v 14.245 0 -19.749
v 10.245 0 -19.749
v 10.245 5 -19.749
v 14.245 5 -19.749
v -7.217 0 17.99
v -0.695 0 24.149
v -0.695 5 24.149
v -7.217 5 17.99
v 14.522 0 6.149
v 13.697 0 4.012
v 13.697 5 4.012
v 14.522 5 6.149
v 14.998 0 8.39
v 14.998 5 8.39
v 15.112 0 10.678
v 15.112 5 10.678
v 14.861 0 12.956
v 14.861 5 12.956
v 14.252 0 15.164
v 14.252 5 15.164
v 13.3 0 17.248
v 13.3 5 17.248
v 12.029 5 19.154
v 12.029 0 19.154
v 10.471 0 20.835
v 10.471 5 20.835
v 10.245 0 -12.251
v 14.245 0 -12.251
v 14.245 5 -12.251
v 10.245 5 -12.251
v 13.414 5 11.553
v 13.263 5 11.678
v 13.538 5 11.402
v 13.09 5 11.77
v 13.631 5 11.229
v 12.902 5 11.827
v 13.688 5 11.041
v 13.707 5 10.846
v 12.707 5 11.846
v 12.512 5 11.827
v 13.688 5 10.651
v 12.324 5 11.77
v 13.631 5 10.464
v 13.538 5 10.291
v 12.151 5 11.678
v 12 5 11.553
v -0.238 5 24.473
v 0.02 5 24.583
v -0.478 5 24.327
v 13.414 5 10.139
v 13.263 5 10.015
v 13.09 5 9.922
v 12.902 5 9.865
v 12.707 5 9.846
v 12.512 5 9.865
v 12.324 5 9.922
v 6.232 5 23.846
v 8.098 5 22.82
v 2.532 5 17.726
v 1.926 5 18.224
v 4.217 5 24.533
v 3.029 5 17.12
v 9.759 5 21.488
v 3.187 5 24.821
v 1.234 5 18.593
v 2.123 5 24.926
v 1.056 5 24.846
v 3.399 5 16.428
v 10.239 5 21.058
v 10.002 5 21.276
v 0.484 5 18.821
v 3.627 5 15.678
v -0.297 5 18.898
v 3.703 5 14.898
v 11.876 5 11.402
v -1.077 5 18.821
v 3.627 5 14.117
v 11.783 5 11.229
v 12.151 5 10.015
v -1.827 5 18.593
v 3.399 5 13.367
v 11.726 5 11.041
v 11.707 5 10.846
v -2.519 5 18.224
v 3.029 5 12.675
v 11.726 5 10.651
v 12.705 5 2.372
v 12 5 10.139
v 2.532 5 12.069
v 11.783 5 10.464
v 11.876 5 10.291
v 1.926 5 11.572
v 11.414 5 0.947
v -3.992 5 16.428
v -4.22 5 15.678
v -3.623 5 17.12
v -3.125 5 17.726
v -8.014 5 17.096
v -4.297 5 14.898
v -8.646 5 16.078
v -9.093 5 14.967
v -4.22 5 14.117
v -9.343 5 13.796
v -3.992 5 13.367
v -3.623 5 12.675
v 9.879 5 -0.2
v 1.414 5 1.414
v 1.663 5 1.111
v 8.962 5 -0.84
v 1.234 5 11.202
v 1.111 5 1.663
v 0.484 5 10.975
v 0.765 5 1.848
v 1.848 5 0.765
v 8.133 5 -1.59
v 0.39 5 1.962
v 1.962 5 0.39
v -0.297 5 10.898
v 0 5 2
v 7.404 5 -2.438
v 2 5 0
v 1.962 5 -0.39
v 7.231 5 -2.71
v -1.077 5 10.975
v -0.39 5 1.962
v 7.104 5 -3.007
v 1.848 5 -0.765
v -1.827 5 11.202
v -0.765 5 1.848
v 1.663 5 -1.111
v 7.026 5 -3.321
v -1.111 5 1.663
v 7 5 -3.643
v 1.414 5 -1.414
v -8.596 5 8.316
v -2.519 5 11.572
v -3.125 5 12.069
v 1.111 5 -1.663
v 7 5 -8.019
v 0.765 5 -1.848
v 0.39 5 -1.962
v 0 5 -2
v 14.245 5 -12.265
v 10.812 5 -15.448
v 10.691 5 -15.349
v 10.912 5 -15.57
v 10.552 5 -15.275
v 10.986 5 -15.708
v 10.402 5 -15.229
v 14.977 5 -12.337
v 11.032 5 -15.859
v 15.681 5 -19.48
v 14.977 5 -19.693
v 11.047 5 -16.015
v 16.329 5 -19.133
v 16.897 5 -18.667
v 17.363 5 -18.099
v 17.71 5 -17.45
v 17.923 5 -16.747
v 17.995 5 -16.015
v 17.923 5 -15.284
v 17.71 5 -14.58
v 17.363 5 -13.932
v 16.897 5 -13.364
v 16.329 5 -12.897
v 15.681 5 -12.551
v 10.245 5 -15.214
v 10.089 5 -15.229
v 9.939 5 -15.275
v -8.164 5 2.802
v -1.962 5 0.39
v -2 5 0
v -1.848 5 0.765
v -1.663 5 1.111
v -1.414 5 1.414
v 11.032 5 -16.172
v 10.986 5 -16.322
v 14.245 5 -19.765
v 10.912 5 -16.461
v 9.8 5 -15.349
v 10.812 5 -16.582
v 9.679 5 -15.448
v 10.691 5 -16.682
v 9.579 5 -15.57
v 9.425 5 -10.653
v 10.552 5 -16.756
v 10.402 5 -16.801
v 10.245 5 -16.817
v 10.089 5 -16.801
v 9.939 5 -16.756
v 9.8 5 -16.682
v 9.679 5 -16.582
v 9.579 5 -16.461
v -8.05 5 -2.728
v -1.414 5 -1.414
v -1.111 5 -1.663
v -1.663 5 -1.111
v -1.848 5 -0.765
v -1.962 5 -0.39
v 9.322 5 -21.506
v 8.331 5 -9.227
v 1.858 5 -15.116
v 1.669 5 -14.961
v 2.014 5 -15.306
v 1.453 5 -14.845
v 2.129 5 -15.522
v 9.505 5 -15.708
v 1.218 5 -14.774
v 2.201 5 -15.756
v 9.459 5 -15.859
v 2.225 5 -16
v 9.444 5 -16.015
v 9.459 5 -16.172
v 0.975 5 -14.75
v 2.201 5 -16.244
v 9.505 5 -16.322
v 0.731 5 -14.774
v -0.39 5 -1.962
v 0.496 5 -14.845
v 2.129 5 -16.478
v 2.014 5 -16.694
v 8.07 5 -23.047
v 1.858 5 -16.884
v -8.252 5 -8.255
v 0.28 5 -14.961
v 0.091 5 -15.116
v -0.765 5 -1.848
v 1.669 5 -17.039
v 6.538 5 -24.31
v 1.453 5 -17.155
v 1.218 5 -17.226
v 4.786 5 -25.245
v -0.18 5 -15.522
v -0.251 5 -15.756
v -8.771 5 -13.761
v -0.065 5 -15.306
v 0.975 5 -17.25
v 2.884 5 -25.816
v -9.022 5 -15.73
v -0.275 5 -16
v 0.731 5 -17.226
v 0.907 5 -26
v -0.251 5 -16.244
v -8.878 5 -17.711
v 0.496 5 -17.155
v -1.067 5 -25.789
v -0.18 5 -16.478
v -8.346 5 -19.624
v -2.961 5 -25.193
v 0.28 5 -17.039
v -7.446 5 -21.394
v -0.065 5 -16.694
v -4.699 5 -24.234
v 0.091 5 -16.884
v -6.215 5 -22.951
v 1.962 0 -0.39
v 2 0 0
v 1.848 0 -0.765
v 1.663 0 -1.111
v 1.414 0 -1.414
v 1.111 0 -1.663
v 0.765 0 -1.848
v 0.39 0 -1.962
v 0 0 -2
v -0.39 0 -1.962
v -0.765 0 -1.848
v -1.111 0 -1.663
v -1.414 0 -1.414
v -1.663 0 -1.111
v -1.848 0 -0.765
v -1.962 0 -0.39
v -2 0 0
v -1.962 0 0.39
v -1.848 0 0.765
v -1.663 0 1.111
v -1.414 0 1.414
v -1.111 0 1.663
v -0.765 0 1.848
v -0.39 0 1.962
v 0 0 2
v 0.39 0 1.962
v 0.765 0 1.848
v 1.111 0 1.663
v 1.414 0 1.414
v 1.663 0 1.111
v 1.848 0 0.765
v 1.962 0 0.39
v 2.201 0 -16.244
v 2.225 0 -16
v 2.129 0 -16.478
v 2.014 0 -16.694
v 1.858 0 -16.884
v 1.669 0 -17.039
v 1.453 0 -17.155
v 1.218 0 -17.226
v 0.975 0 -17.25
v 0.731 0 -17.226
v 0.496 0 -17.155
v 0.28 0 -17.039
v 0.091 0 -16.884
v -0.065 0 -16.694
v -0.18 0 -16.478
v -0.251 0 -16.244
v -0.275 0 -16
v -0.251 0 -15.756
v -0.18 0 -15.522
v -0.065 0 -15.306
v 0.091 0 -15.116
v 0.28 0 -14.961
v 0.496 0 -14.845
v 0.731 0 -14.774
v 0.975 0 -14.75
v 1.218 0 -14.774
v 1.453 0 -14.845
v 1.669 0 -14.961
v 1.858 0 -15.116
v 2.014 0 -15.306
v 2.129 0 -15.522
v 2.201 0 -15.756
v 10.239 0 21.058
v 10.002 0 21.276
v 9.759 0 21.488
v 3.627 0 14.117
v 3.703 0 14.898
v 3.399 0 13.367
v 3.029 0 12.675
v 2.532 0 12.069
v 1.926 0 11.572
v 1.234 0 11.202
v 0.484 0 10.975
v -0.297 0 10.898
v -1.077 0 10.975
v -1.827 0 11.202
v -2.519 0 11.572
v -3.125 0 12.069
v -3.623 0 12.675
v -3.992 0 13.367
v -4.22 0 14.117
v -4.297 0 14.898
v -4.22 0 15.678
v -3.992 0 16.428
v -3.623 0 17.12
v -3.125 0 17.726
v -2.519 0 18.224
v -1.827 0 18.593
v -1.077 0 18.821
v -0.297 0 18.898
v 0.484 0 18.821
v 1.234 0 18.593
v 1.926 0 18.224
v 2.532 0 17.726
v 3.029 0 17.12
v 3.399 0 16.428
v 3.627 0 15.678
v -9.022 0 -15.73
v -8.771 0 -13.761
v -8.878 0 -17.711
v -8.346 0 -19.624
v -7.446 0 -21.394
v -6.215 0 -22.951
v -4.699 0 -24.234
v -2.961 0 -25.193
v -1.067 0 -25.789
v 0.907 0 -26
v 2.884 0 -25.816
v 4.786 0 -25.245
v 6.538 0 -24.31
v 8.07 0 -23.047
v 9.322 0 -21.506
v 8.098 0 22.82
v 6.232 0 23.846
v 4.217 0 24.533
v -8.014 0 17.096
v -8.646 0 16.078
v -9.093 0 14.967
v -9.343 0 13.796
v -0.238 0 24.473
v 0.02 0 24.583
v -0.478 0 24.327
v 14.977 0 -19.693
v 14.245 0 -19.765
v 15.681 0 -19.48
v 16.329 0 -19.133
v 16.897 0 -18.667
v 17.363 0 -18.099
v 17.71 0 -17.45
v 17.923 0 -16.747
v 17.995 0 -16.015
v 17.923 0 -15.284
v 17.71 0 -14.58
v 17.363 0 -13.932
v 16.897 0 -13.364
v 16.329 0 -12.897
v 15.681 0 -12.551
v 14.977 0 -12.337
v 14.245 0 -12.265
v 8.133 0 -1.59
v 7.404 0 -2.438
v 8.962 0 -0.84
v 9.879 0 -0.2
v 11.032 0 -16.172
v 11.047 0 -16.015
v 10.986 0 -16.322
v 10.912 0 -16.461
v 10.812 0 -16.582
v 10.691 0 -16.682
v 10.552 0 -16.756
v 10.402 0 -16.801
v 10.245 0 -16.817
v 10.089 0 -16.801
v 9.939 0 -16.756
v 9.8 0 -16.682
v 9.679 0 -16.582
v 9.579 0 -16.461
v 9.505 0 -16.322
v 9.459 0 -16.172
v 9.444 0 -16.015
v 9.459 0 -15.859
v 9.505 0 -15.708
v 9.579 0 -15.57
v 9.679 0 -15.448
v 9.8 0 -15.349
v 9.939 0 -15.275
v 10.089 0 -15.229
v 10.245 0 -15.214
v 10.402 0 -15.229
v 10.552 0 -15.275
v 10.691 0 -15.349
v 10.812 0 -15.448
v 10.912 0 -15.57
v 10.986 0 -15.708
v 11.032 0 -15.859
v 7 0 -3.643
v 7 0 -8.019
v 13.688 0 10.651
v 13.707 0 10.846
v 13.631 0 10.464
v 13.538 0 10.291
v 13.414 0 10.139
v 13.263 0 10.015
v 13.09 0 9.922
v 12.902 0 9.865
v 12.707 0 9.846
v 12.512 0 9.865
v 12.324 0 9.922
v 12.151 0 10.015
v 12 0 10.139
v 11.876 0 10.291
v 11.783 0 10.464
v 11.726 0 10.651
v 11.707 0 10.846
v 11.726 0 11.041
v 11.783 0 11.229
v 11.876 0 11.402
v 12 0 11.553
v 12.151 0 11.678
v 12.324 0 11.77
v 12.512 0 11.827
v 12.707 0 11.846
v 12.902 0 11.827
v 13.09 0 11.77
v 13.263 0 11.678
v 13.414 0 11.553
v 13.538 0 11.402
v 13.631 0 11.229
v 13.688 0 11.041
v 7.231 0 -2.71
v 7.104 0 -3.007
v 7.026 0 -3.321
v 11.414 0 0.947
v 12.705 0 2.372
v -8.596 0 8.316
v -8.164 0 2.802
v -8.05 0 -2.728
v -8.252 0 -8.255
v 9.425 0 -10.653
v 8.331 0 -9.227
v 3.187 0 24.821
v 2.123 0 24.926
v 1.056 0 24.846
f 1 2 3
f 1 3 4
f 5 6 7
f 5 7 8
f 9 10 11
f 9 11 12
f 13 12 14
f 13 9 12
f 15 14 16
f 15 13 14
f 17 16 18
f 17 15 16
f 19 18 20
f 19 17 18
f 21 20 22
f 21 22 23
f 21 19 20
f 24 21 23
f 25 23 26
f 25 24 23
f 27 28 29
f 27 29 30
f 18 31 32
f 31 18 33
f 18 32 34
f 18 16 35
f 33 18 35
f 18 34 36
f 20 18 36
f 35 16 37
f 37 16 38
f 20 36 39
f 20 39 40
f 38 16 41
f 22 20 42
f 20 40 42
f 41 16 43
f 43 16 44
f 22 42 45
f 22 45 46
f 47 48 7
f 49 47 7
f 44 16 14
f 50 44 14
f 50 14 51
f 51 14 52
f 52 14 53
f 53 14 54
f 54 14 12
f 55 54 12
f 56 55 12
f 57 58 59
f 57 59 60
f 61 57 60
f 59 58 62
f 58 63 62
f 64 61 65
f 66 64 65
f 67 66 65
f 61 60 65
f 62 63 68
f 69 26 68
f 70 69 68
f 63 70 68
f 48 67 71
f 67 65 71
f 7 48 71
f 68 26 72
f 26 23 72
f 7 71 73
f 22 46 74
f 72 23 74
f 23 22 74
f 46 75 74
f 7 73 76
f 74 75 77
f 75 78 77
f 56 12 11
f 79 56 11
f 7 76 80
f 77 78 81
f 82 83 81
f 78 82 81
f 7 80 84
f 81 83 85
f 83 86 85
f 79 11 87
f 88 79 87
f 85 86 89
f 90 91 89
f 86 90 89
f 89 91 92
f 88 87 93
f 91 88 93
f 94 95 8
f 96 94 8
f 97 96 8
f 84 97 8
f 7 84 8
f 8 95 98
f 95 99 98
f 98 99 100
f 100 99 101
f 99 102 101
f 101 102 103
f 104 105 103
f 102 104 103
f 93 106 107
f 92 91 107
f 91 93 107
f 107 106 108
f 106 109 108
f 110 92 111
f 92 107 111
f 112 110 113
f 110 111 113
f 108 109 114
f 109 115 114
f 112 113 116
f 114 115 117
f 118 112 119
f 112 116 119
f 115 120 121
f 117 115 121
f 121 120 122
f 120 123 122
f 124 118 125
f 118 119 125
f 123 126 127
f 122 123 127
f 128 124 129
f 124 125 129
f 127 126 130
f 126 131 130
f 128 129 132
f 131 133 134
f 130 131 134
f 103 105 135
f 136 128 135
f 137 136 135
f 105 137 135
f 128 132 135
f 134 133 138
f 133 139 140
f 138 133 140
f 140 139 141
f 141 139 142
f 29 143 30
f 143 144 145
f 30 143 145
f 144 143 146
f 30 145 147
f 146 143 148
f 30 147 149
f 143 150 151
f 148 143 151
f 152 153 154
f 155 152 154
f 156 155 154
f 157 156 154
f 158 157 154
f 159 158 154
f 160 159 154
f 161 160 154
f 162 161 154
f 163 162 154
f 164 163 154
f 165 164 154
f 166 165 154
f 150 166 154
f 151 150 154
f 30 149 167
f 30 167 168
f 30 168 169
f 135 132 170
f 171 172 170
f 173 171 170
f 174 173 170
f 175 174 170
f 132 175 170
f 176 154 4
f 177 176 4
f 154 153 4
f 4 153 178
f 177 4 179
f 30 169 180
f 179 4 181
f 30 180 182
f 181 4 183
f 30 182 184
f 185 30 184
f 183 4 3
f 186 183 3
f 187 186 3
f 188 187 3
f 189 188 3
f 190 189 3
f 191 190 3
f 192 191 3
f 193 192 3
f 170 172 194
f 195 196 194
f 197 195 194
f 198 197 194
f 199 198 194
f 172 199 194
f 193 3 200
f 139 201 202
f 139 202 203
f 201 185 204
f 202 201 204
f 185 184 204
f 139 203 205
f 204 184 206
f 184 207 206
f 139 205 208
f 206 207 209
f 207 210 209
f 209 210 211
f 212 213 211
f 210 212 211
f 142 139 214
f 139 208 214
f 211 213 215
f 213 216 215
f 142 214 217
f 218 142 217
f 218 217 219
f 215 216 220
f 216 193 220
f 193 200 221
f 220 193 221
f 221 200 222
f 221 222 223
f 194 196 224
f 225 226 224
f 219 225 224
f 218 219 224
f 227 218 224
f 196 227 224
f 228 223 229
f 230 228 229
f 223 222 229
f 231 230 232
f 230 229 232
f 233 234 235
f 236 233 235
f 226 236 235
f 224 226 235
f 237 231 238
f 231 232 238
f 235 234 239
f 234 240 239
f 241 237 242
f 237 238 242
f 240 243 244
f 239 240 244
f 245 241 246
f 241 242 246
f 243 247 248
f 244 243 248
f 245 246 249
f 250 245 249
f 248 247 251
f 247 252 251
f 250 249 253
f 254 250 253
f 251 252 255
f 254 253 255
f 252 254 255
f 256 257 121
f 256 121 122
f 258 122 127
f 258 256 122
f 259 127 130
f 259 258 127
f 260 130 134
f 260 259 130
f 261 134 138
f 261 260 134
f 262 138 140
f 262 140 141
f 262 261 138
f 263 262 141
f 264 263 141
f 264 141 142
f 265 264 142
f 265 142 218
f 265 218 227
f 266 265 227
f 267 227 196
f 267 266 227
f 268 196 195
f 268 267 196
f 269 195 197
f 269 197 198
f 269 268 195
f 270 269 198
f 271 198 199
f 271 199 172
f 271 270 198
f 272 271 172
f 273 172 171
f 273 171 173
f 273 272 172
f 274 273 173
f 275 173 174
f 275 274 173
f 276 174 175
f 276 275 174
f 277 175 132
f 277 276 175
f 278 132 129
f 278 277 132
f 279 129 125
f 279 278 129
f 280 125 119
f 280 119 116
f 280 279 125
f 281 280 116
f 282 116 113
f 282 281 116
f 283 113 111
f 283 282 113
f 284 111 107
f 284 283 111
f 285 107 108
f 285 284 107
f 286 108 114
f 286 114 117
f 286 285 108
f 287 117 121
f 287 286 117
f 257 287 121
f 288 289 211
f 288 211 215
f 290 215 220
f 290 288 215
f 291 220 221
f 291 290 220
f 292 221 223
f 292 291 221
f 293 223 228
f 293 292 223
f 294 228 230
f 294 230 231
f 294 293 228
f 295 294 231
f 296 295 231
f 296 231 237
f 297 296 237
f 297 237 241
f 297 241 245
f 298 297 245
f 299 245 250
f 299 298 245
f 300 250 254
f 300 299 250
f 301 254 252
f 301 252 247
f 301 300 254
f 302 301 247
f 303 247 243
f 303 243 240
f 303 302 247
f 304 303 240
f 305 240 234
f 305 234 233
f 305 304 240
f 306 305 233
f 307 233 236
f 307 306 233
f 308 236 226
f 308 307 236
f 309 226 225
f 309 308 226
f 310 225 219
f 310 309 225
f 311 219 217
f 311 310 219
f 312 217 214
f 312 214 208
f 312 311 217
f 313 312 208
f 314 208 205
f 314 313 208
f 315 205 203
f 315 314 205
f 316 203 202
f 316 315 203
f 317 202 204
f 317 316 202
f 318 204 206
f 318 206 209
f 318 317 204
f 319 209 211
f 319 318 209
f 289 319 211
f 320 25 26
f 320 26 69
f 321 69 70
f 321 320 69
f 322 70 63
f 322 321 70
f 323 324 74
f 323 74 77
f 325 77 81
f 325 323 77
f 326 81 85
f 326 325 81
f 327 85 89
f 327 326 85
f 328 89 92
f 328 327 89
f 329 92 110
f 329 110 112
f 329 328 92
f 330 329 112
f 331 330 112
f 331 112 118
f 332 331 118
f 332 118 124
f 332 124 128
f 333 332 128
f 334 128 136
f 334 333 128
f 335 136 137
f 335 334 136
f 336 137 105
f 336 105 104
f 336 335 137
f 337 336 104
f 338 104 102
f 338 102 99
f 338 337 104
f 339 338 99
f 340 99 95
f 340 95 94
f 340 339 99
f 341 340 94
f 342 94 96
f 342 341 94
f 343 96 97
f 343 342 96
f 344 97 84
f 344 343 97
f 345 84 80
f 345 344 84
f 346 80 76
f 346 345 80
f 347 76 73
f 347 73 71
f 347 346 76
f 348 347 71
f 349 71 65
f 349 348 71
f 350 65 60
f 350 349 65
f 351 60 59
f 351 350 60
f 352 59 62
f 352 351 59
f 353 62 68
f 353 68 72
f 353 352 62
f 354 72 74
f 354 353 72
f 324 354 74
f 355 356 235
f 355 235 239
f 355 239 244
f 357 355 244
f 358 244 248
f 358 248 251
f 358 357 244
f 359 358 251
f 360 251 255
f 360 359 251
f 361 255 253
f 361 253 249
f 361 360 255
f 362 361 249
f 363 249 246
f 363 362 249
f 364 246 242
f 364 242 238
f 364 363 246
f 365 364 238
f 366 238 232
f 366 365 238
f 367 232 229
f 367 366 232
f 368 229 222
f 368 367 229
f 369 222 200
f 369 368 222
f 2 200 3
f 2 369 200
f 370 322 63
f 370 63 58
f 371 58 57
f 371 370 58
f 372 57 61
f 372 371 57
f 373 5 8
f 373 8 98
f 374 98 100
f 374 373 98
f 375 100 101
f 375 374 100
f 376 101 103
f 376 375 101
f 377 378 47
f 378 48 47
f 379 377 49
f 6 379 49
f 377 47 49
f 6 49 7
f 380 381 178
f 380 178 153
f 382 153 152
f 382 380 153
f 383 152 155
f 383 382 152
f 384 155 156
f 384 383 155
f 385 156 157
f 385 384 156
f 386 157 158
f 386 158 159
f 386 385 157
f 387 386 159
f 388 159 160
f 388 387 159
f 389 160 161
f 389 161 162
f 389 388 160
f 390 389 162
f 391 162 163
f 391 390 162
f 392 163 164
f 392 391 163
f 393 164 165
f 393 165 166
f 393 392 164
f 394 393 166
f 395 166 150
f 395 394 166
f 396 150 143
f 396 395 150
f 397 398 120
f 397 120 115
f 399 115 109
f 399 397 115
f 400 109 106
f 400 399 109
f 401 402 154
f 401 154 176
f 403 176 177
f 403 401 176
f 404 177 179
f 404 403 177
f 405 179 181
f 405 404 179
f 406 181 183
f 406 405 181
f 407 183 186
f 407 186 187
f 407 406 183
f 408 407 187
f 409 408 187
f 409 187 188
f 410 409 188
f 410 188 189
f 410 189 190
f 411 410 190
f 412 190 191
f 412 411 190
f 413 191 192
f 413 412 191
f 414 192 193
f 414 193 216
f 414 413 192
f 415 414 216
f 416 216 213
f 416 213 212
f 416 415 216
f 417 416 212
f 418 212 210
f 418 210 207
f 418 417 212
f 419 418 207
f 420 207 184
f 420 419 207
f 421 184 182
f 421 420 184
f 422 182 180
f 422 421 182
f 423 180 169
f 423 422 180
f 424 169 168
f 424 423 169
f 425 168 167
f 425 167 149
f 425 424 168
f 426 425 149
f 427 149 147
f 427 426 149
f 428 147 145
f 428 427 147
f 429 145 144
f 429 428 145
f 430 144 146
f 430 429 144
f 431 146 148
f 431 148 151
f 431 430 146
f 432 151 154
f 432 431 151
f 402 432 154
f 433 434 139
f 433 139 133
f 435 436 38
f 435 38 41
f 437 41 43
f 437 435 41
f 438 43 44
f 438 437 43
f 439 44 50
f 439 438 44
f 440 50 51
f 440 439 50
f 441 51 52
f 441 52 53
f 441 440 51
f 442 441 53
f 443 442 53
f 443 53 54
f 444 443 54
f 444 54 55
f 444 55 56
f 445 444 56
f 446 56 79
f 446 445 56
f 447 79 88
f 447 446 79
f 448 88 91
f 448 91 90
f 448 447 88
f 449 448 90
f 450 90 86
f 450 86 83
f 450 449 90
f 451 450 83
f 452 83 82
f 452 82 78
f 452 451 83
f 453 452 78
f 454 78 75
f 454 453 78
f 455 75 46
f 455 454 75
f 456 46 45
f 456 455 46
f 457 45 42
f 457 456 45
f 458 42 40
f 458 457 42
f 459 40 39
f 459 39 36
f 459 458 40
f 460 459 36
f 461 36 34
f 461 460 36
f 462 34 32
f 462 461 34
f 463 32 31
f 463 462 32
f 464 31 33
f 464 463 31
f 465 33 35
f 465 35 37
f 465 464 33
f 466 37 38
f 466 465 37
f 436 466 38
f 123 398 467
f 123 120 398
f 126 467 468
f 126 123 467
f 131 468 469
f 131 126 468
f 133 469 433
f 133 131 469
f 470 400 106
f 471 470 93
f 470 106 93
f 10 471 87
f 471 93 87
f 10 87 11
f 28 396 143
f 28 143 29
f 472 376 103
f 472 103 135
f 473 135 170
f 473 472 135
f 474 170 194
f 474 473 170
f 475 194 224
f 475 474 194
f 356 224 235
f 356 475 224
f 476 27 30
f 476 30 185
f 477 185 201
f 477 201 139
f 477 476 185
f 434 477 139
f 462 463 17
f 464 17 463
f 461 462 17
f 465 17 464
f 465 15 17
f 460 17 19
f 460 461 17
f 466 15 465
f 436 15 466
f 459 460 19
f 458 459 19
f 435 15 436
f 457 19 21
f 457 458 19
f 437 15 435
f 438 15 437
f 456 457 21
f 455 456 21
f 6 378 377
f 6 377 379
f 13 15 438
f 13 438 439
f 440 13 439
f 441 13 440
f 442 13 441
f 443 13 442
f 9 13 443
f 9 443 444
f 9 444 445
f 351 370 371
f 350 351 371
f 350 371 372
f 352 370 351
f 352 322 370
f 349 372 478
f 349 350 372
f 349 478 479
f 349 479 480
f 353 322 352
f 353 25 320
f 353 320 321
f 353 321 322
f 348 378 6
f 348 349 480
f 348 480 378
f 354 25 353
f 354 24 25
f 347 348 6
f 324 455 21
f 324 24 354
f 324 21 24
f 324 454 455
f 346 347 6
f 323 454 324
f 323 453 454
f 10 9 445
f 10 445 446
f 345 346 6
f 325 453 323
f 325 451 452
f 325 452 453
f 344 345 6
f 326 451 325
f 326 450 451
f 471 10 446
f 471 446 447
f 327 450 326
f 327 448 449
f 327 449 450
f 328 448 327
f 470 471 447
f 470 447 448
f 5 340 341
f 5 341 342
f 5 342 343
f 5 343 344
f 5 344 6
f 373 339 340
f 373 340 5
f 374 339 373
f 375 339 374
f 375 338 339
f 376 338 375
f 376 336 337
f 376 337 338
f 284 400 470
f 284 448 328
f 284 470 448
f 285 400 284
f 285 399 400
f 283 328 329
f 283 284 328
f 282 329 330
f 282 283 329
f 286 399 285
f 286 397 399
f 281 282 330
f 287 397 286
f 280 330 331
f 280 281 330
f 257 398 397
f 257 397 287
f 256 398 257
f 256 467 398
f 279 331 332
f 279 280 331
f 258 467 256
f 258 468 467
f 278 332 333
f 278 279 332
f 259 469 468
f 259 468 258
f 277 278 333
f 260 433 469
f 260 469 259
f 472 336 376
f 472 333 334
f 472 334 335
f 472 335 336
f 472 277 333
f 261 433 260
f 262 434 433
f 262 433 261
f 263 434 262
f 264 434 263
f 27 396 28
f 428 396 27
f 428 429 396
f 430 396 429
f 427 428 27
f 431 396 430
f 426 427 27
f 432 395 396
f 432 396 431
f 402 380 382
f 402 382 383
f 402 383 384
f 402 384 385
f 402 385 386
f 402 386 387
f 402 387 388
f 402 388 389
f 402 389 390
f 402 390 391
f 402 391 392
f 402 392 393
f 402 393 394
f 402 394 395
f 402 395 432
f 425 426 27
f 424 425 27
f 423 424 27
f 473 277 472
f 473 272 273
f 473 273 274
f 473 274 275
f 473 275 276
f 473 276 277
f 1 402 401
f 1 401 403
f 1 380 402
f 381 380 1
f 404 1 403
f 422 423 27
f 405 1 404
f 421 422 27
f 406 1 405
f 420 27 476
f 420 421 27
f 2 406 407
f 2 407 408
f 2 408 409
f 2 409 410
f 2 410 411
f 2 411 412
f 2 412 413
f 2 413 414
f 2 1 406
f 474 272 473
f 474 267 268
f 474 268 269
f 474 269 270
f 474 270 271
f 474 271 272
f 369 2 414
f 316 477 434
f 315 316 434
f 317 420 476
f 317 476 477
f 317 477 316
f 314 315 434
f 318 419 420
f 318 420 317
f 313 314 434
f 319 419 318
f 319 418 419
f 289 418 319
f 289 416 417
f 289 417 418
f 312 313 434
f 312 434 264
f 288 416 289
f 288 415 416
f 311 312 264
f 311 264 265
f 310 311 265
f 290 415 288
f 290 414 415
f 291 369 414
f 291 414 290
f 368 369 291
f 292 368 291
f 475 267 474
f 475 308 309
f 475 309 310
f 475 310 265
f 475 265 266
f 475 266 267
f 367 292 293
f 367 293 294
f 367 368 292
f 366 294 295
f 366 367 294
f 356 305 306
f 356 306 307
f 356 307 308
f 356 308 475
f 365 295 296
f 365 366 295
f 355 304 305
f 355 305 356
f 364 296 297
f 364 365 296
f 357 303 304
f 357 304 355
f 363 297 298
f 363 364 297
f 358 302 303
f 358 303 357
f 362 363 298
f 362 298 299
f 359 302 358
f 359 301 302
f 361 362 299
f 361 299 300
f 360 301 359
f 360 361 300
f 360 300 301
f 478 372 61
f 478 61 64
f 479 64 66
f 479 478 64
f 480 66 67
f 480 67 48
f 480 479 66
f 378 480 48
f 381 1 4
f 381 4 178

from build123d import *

# Parameters (mm, degrees)
SKETCH1_R           = 2
SKETCH1_R_2         = 4
SKETCH1_R_3         = 1.25
SKETCH1_R_4         = 0.801632387
SKETCH1_R_5         = 1
BOSS_EXTRUDE1_DEPTH = 5
FILLET1_R           = 10
FILLET2_R           = 2
FILLET3_R           = 2


with BuildPart() as part:
    # Sketch1 → Boss-Extrude1 (new body)
    with BuildSketch(Plane(origin=(0, 0, 0), x_dir=(1, 0, 0), z_dir=(0, 1, 0))):
        with BuildLine():
            Line((10.245447832, 19.748535419), (14.245447832, 19.748535419))
            Line((14.245447832, 19.748535419), (14.245447832, 19.765232538))
            ThreePointArc((14.245447832, 19.765232538), (17.995447832, 16.015232538), (14.245447832, 12.265232538))
            Line((14.245447832, 12.265232538), (14.245447832, 12.251464581))
            Line((14.245447832, 12.251464581), (10.245447832, 12.251464581))
            ThreePointArc((10.245447832, 12.251464581), (8.910242614, 9.915125816), (7.000398069, 8.019408112))
            Line((7.000398069, 8.019408112), (7.000398069, 3.019408112))
            ThreePointArc((7.000398069, 3.019408112), (8.876398613, 0.90896847), (11.319846515, -0.506268567))
            ThreePointArc((11.319846515, -0.506268567), (15.105800834, -10.846250302), (10.471403603, -20.834795477))
            ThreePointArc((10.471403603, -20.834795477), (10.121274527, -21.168091922), (9.758861069, -21.487987805))
            ThreePointArc((9.758861069, -21.487987805), (7.187603365, -23.373618777), (4.217131367, -24.532612502))
            ThreePointArc((4.217131367, -24.532612502), (1.88896648, -24.924600666), (-0.415858892, -24.412949939))
            Line((-0.415858892, -24.412949939), (-7.21726234, -17.990260503))
            ThreePointArc((-7.21726234, -17.990260503), (-8.645604673, -16.078135797), (-9.343313072, -13.79568411))
            ThreePointArc((-9.343313072, -13.79568411), (-8.067302671, -0.037990819), (-8.771466645, 13.760794646))
            ThreePointArc((-8.771466645, 13.760794646), (-2.028677736, 25.538358263), (10.245447832, 19.748535419))
        make_face()
        Circle(SKETCH1_R, mode=Mode.SUBTRACT)
        with Locations((-0.296635989, -14.897704258)):
            Circle(SKETCH1_R_2, mode=Mode.SUBTRACT)
        with Locations((0.974607405, 16)):
            Circle(SKETCH1_R_3, mode=Mode.SUBTRACT)
        with Locations((10.245447832, 16.015232538)):
            Circle(SKETCH1_R_4, mode=Mode.SUBTRACT)
        with Locations((12.706975529, -10.846250302)):
            Circle(SKETCH1_R_5, mode=Mode.SUBTRACT)
    extrude(amount=BOSS_EXTRUDE1_DEPTH)

    # Fillet1
    fillet1_edges = [part.edges().sort_by_distance(p)[0] for p in [
        (11.319846515, 2.5, 0.506268567),
    ]]
    fillet(fillet1_edges, radius=FILLET1_R)

    # Fillet2
    fillet2_edges = [part.edges().sort_by_distance(p)[0] for p in [
        (7.000398069, 2.5, -3.019408112),
    ]]
    fillet(fillet2_edges, radius=FILLET2_R)

    # Fillet3
    fillet3_edges = [part.edges().sort_by_distance(p)[0] for p in [
        (-0.415858892, 2.5, 24.412949939),
    ]]
    fillet(fillet3_edges, radius=FILLET3_R)


solid = part.part
